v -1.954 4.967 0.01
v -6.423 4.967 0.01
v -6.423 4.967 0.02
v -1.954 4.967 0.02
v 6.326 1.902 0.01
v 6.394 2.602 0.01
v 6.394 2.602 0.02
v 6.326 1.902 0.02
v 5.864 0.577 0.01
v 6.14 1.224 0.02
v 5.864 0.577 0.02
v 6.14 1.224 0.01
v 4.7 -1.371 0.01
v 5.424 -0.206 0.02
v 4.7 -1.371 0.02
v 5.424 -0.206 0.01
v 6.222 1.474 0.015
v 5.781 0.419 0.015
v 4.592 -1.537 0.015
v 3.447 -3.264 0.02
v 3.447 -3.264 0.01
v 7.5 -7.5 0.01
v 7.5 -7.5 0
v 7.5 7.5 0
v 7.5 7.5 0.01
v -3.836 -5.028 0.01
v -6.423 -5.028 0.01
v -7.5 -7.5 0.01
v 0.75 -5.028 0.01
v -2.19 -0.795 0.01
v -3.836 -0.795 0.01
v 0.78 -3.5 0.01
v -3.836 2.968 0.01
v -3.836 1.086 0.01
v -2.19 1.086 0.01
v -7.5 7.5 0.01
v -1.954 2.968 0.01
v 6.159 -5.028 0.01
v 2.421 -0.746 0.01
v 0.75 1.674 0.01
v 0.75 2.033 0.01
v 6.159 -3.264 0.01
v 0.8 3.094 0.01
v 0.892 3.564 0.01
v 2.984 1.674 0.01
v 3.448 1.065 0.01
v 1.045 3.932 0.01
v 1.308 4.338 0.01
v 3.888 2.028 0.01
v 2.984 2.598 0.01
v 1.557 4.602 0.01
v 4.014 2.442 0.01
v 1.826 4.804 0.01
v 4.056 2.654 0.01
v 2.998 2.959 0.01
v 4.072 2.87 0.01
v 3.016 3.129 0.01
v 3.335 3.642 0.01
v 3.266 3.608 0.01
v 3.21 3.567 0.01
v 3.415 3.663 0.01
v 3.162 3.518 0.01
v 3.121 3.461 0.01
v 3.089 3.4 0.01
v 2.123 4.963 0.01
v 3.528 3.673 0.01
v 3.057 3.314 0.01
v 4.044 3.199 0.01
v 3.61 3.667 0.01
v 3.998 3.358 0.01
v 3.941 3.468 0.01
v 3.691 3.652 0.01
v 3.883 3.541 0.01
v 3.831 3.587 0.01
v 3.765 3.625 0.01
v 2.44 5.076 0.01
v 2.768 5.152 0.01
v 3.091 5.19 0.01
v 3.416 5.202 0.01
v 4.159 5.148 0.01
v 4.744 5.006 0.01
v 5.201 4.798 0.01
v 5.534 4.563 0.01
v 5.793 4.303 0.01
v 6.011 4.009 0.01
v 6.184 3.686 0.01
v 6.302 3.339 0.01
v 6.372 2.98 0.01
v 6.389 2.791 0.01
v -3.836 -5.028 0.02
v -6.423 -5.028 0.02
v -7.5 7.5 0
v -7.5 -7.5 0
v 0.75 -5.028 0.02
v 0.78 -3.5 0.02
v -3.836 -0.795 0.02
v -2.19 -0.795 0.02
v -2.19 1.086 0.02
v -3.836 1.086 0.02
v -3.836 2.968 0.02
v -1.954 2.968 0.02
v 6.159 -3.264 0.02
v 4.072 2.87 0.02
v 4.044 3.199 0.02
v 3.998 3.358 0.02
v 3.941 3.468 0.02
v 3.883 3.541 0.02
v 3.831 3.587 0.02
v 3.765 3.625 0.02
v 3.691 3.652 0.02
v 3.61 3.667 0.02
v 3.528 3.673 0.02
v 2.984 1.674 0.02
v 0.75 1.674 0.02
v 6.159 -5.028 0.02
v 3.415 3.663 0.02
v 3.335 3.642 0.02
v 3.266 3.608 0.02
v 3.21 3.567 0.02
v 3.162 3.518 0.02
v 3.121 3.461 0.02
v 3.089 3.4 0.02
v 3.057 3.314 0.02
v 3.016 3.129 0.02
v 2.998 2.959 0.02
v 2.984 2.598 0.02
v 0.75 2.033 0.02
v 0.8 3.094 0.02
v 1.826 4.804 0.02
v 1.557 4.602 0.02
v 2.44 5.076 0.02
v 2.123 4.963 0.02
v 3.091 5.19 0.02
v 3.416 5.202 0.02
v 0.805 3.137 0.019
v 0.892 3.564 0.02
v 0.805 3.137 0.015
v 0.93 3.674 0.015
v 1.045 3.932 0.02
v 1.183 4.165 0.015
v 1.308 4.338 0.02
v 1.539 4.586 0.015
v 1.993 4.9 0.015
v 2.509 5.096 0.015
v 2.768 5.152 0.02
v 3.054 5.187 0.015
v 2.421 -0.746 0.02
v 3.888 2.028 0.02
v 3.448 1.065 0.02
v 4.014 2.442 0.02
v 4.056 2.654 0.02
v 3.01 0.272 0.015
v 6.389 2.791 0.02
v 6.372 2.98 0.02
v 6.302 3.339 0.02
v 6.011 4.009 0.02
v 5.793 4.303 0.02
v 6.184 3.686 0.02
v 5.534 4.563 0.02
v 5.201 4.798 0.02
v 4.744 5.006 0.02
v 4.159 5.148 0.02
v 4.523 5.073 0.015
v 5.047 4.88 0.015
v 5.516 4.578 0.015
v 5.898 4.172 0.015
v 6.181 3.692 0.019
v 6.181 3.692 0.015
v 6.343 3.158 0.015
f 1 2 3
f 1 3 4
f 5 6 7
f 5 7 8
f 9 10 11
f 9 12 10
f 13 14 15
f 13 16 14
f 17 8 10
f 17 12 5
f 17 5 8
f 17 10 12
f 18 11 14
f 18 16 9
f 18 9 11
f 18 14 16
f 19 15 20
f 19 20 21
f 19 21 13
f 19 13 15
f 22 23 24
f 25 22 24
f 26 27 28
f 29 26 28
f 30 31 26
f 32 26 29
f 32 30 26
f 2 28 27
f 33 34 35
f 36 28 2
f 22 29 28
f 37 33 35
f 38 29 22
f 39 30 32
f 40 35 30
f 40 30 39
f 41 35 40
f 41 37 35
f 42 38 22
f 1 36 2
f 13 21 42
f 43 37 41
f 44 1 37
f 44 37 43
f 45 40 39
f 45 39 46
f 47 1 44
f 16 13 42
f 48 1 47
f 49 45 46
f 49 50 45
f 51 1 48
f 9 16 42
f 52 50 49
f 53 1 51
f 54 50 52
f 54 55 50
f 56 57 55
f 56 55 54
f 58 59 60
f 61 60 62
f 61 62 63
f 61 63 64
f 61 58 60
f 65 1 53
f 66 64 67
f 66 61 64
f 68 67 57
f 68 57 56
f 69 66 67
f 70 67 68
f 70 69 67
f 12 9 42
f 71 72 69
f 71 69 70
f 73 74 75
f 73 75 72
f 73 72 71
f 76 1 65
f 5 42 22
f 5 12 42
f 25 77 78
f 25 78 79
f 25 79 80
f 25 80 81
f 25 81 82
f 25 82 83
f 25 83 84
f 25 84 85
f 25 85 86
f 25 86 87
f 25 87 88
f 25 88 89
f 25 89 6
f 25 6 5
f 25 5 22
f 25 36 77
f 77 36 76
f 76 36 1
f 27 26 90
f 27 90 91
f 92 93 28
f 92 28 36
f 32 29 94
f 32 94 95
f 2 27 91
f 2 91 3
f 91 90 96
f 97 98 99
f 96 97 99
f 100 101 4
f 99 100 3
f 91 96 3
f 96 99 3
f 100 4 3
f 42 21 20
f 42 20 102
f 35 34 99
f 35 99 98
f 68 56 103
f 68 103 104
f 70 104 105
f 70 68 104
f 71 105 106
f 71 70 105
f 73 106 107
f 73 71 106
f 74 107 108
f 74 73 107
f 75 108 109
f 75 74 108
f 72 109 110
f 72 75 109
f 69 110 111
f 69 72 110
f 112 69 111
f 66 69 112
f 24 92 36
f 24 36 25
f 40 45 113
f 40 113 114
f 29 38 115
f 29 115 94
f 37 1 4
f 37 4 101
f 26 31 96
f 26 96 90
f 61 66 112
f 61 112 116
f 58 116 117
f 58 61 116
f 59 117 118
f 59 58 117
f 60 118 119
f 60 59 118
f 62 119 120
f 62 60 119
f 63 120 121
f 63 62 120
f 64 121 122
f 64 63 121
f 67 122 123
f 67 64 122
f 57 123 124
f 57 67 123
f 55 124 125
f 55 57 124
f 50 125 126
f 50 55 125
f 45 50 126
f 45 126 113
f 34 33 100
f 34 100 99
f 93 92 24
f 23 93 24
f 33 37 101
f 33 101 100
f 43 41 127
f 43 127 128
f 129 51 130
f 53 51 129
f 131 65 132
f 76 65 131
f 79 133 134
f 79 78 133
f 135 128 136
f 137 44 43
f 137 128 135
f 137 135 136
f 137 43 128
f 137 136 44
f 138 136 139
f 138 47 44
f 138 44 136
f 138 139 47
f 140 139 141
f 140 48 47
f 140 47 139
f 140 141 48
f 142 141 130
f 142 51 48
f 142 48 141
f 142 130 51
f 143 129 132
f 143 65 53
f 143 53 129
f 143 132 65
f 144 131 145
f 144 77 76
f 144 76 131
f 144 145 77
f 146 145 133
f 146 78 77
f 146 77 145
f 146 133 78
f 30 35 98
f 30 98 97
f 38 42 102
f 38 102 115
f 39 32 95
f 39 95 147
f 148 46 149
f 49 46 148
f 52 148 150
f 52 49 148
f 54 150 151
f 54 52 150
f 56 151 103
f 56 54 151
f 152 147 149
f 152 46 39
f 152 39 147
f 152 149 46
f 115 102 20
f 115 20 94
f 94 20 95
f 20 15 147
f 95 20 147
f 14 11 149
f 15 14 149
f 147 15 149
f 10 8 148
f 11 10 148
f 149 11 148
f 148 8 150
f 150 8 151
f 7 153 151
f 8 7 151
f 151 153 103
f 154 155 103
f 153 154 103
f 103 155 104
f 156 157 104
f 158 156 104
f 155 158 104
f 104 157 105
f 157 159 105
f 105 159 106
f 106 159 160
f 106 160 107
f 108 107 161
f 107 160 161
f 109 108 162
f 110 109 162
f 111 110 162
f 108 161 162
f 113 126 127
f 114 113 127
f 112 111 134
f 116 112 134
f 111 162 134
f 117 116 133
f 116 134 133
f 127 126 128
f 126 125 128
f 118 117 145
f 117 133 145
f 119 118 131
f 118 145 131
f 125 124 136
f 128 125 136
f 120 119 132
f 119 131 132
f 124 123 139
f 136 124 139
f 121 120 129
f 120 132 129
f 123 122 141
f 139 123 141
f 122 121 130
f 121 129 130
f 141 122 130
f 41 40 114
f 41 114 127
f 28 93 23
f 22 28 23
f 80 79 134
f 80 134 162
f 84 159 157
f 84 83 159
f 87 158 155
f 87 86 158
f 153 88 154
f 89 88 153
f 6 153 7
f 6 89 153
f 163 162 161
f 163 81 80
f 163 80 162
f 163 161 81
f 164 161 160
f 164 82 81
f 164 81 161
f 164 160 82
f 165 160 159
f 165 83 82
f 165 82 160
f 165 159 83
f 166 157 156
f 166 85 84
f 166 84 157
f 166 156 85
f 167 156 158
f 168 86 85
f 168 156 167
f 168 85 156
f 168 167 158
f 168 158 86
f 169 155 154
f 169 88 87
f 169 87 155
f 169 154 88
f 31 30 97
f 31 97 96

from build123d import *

# Parameters (mm, degrees)
SKETCH1_W           = 15
SKETCH1_H           = 15
BASE_EXTRUDE_DEPTH  = 0.01
BOSS_EXTRUDE1_DEPTH = 0.01


with BuildPart() as part:
    # Sketch1 → Base-Extrude (new body)
    with BuildSketch(Plane.XY):
        Rectangle(SKETCH1_W, SKETCH1_H)
    extrude(amount=BASE_EXTRUDE_DEPTH)

    # Sketch3 → Boss-Extrude1 (add)
    with BuildSketch(Plane.XY.offset(0.01)):
        Polygon((-6.422687471, 4.966697862), (-1.95437388, 4.966697862), (-1.95437388, 2.967715466), (-3.835769076, 2.967715466), (-3.835769076, 1.08632027), (-2.189548279, 1.08632027), (-2.189548279, -0.795074926), (-3.835769076, -0.795074926), (-3.835769076, -5.028214117), (-6.422687471, -5.028214117), align=None)
        with BuildLine():
            Line((6.159142904, -3.264406121), (6.159142904, -5.028214117))
            Line((6.159142904, -5.028214117), (0.750131715, -5.028214117))
            Line((0.750131715, -5.028214117), (0.779528515, -3.499580521))
            add(Edge.make_bspline(
                [(0.779528515, -3.499580521), (0.877014083, -3.338576188), (1.066979862, -3.024834225), (1.343045705, -2.56480754), (1.602681012, -2.128002305), (1.850432695, -1.716510192), (2.079193397, -1.326713925), (2.294345848, -0.961203267), (2.494671208, -0.619498336), (2.679973751, -0.301493491), (2.851966968, -0.007907642), (3.004887743, 0.263950757), (3.145640195, 0.510739163), (3.270514365, 0.733991797), (3.3786378, 0.934750039), (3.473207235, 1.111300707), (3.551330736, 1.264877002), (3.636598876, 1.434182645), (3.725717962, 1.624674223), (3.817352242, 1.840530263), (3.894914579, 2.044060275), (3.960461689, 2.233412865), (4.006982766, 2.411483456), (4.046334489, 2.574975972), (4.066429896, 2.727136462), (4.070191411, 2.824363225), (4.071970108, 2.870338566)],
                knots=[0, 0, 0, 0, 0.000564652, 0.001100313, 0.001609507, 0.002089081, 0.002541254, 0.002965388, 0.003361483, 0.00372954, 0.004069559, 0.004382224, 0.004665264, 0.004921882, 0.005149603, 0.005349329, 0.005522708, 0.005666499, 0.005918015, 0.006153476, 0.00636981, 0.00657142, 0.006754155, 0.006921752, 0.007075582, 0.007213575, 0.007213575, 0.007213575, 0.007213575], degree=3))
            add(Edge.make_bspline(
                [(4.071970108, 2.870338566), (4.070068672, 2.933484515), (4.066508767, 3.051707609), (4.04433705, 3.217001799), (4.002738782, 3.357003396), (3.943565001, 3.472371568), (3.867169386, 3.564598818), (3.769499006, 3.629208641), (3.653793224, 3.66631058), (3.571275415, 3.67085994), (3.528129309, 3.673238665)],
                knots=[0, 0, 0, 0, 0.000189465, 0.00035472, 0.000498851, 0.000625412, 0.000741395, 0.000854011, 0.000971956, 0.001101209, 0.001101209, 0.001101209, 0.001101209], degree=3))
            add(Edge.make_bspline(
                [(3.528129309, 3.673238665), (3.484910432, 3.671163948), (3.401853536, 3.667176812), (3.285749318, 3.625396077), (3.188411854, 3.554676877), (3.125112869, 3.473103812), (3.084579248, 3.393226095), (3.05651705, 3.3188966), (3.036714643, 3.230759277), (3.014954485, 3.130743563), (3.000980696, 3.016402907), (2.993317763, 2.888767878), (2.984453815, 2.747962897), (2.984345395, 2.649879731), (2.98428851, 2.598418167)],
                knots=[0, 0, 0, 0, 0.000129252, 0.000248394, 0.000364158, 0.000485823, 0.000554026, 0.000632516, 0.00072342, 0.000824672, 0.000939529, 0.001068468, 0.001208296, 0.00136264, 0.00136264, 0.00136264, 0.00136264], degree=3))
            Line((2.98428851, 2.598418167), (2.98428851, 1.674256269))
            Line((2.98428851, 1.674256269), (0.750131715, 1.674256269))
            Line((0.750131715, 1.674256269), (0.750131715, 2.032529768))
            add(Edge.make_bspline(
                [(0.750131715, 2.032529768), (0.751022306, 2.16238688), (0.752707687, 2.408132412), (0.769457747, 2.75497652), (0.794121954, 3.058519518), (0.829016676, 3.326551357), (0.8889659, 3.572609948), (0.980977076, 3.808592891), (1.100992692, 4.043964564), (1.252566069, 4.272463253), (1.429507662, 4.48928336), (1.638168026, 4.678306609), (1.871509665, 4.838617245), (2.129530989, 4.972884244), (2.414907456, 5.074410455), (2.724975997, 5.15020006), (3.062040959, 5.194068001), (3.295275309, 5.19920968), (3.416054009, 5.201872262)],
                knots=[0, 0, 0, 0, 0.000389547, 0.00073719, 0.001041434, 0.001303086, 0.001547281, 0.001799098, 0.002061221, 0.002338435, 0.002620255, 0.00289858, 0.003179903, 0.003467515, 0.003768586, 0.004086312, 0.004423595, 0.004785841, 0.004785841, 0.004785841, 0.004785841], degree=3))
            add(Edge.make_bspline(
                [(3.416054009, 5.201872262), (3.534966431, 5.200080949), (3.765988513, 5.196600802), (4.101222792, 5.160428229), (4.414479271, 5.105247103), (4.705518743, 5.023904179), (4.974089205, 4.91969881), (5.220309249, 4.792782177), (5.443526672, 4.64230899), (5.643566838, 4.469806168), (5.819026319, 4.278351536), (5.973160681, 4.074852589), (6.103805742, 3.859461087), (6.211974397, 3.632193542), (6.292222673, 3.39113189), (6.350412677, 3.138911047), (6.389348309, 2.874602653), (6.392639634, 2.69409963), (6.394317303, 2.602092767)],
                knots=[0, 0, 0, 0, 0.000356607, 0.000692812, 0.001010304, 0.001309874, 0.001597838, 0.001873127, 0.00213913, 0.00240358, 0.002663621, 0.002916802, 0.00316825, 0.003418103, 0.003670262, 0.003928747, 0.004194038, 0.004469854, 0.004469854, 0.004469854, 0.004469854], degree=3))
            add(Edge.make_bspline(
                [(6.394317303, 2.602092767), (6.392746801, 2.530392619), (6.389573077, 2.385498544), (6.368416534, 2.166525542), (6.335496514, 1.944494313), (6.289237681, 1.718691614), (6.228852902, 1.490592136), (6.154009792, 1.259261118), (6.068593193, 1.024462193), (5.983251437, 0.825045072), (5.903440559, 0.656268599), (5.831206174, 0.511348432), (5.744678172, 0.350644217), (5.645434225, 0.172419472), (5.533178231, -0.022253367), (5.408235872, -0.23355711), (5.269714361, -0.461563791), (5.12022609, -0.707268255), (4.955268897, -0.968500781), (4.779876872, -1.248181418), (4.588522389, -1.542420961), (4.386080467, -1.854729454), (4.169155651, -2.182111033), (3.941284953, -2.528915012), (3.699482969, -2.89155892), (3.532558952, -3.138340923), (3.447288109, -3.264406121)],
                knots=[0, 0, 0, 0, 0.00021509, 0.00043466, 0.00065942, 0.000888229, 0.00112576, 0.001366894, 0.001617421, 0.001875076, 0.002017262, 0.002177487, 0.002360785, 0.002564758, 0.002789458, 0.003034921, 0.003301178, 0.003589815, 0.003897721, 0.004228026, 0.004580179, 0.004950663, 0.00534457, 0.00575835, 0.006195566, 0.006652153, 0.006652153, 0.006652153, 0.006652153], degree=3))
            Line((3.447288109, -3.264406121), (6.159142904, -3.264406121))
        make_face()
    extrude(amount=BOSS_EXTRUDE1_DEPTH)


solid = part.part
